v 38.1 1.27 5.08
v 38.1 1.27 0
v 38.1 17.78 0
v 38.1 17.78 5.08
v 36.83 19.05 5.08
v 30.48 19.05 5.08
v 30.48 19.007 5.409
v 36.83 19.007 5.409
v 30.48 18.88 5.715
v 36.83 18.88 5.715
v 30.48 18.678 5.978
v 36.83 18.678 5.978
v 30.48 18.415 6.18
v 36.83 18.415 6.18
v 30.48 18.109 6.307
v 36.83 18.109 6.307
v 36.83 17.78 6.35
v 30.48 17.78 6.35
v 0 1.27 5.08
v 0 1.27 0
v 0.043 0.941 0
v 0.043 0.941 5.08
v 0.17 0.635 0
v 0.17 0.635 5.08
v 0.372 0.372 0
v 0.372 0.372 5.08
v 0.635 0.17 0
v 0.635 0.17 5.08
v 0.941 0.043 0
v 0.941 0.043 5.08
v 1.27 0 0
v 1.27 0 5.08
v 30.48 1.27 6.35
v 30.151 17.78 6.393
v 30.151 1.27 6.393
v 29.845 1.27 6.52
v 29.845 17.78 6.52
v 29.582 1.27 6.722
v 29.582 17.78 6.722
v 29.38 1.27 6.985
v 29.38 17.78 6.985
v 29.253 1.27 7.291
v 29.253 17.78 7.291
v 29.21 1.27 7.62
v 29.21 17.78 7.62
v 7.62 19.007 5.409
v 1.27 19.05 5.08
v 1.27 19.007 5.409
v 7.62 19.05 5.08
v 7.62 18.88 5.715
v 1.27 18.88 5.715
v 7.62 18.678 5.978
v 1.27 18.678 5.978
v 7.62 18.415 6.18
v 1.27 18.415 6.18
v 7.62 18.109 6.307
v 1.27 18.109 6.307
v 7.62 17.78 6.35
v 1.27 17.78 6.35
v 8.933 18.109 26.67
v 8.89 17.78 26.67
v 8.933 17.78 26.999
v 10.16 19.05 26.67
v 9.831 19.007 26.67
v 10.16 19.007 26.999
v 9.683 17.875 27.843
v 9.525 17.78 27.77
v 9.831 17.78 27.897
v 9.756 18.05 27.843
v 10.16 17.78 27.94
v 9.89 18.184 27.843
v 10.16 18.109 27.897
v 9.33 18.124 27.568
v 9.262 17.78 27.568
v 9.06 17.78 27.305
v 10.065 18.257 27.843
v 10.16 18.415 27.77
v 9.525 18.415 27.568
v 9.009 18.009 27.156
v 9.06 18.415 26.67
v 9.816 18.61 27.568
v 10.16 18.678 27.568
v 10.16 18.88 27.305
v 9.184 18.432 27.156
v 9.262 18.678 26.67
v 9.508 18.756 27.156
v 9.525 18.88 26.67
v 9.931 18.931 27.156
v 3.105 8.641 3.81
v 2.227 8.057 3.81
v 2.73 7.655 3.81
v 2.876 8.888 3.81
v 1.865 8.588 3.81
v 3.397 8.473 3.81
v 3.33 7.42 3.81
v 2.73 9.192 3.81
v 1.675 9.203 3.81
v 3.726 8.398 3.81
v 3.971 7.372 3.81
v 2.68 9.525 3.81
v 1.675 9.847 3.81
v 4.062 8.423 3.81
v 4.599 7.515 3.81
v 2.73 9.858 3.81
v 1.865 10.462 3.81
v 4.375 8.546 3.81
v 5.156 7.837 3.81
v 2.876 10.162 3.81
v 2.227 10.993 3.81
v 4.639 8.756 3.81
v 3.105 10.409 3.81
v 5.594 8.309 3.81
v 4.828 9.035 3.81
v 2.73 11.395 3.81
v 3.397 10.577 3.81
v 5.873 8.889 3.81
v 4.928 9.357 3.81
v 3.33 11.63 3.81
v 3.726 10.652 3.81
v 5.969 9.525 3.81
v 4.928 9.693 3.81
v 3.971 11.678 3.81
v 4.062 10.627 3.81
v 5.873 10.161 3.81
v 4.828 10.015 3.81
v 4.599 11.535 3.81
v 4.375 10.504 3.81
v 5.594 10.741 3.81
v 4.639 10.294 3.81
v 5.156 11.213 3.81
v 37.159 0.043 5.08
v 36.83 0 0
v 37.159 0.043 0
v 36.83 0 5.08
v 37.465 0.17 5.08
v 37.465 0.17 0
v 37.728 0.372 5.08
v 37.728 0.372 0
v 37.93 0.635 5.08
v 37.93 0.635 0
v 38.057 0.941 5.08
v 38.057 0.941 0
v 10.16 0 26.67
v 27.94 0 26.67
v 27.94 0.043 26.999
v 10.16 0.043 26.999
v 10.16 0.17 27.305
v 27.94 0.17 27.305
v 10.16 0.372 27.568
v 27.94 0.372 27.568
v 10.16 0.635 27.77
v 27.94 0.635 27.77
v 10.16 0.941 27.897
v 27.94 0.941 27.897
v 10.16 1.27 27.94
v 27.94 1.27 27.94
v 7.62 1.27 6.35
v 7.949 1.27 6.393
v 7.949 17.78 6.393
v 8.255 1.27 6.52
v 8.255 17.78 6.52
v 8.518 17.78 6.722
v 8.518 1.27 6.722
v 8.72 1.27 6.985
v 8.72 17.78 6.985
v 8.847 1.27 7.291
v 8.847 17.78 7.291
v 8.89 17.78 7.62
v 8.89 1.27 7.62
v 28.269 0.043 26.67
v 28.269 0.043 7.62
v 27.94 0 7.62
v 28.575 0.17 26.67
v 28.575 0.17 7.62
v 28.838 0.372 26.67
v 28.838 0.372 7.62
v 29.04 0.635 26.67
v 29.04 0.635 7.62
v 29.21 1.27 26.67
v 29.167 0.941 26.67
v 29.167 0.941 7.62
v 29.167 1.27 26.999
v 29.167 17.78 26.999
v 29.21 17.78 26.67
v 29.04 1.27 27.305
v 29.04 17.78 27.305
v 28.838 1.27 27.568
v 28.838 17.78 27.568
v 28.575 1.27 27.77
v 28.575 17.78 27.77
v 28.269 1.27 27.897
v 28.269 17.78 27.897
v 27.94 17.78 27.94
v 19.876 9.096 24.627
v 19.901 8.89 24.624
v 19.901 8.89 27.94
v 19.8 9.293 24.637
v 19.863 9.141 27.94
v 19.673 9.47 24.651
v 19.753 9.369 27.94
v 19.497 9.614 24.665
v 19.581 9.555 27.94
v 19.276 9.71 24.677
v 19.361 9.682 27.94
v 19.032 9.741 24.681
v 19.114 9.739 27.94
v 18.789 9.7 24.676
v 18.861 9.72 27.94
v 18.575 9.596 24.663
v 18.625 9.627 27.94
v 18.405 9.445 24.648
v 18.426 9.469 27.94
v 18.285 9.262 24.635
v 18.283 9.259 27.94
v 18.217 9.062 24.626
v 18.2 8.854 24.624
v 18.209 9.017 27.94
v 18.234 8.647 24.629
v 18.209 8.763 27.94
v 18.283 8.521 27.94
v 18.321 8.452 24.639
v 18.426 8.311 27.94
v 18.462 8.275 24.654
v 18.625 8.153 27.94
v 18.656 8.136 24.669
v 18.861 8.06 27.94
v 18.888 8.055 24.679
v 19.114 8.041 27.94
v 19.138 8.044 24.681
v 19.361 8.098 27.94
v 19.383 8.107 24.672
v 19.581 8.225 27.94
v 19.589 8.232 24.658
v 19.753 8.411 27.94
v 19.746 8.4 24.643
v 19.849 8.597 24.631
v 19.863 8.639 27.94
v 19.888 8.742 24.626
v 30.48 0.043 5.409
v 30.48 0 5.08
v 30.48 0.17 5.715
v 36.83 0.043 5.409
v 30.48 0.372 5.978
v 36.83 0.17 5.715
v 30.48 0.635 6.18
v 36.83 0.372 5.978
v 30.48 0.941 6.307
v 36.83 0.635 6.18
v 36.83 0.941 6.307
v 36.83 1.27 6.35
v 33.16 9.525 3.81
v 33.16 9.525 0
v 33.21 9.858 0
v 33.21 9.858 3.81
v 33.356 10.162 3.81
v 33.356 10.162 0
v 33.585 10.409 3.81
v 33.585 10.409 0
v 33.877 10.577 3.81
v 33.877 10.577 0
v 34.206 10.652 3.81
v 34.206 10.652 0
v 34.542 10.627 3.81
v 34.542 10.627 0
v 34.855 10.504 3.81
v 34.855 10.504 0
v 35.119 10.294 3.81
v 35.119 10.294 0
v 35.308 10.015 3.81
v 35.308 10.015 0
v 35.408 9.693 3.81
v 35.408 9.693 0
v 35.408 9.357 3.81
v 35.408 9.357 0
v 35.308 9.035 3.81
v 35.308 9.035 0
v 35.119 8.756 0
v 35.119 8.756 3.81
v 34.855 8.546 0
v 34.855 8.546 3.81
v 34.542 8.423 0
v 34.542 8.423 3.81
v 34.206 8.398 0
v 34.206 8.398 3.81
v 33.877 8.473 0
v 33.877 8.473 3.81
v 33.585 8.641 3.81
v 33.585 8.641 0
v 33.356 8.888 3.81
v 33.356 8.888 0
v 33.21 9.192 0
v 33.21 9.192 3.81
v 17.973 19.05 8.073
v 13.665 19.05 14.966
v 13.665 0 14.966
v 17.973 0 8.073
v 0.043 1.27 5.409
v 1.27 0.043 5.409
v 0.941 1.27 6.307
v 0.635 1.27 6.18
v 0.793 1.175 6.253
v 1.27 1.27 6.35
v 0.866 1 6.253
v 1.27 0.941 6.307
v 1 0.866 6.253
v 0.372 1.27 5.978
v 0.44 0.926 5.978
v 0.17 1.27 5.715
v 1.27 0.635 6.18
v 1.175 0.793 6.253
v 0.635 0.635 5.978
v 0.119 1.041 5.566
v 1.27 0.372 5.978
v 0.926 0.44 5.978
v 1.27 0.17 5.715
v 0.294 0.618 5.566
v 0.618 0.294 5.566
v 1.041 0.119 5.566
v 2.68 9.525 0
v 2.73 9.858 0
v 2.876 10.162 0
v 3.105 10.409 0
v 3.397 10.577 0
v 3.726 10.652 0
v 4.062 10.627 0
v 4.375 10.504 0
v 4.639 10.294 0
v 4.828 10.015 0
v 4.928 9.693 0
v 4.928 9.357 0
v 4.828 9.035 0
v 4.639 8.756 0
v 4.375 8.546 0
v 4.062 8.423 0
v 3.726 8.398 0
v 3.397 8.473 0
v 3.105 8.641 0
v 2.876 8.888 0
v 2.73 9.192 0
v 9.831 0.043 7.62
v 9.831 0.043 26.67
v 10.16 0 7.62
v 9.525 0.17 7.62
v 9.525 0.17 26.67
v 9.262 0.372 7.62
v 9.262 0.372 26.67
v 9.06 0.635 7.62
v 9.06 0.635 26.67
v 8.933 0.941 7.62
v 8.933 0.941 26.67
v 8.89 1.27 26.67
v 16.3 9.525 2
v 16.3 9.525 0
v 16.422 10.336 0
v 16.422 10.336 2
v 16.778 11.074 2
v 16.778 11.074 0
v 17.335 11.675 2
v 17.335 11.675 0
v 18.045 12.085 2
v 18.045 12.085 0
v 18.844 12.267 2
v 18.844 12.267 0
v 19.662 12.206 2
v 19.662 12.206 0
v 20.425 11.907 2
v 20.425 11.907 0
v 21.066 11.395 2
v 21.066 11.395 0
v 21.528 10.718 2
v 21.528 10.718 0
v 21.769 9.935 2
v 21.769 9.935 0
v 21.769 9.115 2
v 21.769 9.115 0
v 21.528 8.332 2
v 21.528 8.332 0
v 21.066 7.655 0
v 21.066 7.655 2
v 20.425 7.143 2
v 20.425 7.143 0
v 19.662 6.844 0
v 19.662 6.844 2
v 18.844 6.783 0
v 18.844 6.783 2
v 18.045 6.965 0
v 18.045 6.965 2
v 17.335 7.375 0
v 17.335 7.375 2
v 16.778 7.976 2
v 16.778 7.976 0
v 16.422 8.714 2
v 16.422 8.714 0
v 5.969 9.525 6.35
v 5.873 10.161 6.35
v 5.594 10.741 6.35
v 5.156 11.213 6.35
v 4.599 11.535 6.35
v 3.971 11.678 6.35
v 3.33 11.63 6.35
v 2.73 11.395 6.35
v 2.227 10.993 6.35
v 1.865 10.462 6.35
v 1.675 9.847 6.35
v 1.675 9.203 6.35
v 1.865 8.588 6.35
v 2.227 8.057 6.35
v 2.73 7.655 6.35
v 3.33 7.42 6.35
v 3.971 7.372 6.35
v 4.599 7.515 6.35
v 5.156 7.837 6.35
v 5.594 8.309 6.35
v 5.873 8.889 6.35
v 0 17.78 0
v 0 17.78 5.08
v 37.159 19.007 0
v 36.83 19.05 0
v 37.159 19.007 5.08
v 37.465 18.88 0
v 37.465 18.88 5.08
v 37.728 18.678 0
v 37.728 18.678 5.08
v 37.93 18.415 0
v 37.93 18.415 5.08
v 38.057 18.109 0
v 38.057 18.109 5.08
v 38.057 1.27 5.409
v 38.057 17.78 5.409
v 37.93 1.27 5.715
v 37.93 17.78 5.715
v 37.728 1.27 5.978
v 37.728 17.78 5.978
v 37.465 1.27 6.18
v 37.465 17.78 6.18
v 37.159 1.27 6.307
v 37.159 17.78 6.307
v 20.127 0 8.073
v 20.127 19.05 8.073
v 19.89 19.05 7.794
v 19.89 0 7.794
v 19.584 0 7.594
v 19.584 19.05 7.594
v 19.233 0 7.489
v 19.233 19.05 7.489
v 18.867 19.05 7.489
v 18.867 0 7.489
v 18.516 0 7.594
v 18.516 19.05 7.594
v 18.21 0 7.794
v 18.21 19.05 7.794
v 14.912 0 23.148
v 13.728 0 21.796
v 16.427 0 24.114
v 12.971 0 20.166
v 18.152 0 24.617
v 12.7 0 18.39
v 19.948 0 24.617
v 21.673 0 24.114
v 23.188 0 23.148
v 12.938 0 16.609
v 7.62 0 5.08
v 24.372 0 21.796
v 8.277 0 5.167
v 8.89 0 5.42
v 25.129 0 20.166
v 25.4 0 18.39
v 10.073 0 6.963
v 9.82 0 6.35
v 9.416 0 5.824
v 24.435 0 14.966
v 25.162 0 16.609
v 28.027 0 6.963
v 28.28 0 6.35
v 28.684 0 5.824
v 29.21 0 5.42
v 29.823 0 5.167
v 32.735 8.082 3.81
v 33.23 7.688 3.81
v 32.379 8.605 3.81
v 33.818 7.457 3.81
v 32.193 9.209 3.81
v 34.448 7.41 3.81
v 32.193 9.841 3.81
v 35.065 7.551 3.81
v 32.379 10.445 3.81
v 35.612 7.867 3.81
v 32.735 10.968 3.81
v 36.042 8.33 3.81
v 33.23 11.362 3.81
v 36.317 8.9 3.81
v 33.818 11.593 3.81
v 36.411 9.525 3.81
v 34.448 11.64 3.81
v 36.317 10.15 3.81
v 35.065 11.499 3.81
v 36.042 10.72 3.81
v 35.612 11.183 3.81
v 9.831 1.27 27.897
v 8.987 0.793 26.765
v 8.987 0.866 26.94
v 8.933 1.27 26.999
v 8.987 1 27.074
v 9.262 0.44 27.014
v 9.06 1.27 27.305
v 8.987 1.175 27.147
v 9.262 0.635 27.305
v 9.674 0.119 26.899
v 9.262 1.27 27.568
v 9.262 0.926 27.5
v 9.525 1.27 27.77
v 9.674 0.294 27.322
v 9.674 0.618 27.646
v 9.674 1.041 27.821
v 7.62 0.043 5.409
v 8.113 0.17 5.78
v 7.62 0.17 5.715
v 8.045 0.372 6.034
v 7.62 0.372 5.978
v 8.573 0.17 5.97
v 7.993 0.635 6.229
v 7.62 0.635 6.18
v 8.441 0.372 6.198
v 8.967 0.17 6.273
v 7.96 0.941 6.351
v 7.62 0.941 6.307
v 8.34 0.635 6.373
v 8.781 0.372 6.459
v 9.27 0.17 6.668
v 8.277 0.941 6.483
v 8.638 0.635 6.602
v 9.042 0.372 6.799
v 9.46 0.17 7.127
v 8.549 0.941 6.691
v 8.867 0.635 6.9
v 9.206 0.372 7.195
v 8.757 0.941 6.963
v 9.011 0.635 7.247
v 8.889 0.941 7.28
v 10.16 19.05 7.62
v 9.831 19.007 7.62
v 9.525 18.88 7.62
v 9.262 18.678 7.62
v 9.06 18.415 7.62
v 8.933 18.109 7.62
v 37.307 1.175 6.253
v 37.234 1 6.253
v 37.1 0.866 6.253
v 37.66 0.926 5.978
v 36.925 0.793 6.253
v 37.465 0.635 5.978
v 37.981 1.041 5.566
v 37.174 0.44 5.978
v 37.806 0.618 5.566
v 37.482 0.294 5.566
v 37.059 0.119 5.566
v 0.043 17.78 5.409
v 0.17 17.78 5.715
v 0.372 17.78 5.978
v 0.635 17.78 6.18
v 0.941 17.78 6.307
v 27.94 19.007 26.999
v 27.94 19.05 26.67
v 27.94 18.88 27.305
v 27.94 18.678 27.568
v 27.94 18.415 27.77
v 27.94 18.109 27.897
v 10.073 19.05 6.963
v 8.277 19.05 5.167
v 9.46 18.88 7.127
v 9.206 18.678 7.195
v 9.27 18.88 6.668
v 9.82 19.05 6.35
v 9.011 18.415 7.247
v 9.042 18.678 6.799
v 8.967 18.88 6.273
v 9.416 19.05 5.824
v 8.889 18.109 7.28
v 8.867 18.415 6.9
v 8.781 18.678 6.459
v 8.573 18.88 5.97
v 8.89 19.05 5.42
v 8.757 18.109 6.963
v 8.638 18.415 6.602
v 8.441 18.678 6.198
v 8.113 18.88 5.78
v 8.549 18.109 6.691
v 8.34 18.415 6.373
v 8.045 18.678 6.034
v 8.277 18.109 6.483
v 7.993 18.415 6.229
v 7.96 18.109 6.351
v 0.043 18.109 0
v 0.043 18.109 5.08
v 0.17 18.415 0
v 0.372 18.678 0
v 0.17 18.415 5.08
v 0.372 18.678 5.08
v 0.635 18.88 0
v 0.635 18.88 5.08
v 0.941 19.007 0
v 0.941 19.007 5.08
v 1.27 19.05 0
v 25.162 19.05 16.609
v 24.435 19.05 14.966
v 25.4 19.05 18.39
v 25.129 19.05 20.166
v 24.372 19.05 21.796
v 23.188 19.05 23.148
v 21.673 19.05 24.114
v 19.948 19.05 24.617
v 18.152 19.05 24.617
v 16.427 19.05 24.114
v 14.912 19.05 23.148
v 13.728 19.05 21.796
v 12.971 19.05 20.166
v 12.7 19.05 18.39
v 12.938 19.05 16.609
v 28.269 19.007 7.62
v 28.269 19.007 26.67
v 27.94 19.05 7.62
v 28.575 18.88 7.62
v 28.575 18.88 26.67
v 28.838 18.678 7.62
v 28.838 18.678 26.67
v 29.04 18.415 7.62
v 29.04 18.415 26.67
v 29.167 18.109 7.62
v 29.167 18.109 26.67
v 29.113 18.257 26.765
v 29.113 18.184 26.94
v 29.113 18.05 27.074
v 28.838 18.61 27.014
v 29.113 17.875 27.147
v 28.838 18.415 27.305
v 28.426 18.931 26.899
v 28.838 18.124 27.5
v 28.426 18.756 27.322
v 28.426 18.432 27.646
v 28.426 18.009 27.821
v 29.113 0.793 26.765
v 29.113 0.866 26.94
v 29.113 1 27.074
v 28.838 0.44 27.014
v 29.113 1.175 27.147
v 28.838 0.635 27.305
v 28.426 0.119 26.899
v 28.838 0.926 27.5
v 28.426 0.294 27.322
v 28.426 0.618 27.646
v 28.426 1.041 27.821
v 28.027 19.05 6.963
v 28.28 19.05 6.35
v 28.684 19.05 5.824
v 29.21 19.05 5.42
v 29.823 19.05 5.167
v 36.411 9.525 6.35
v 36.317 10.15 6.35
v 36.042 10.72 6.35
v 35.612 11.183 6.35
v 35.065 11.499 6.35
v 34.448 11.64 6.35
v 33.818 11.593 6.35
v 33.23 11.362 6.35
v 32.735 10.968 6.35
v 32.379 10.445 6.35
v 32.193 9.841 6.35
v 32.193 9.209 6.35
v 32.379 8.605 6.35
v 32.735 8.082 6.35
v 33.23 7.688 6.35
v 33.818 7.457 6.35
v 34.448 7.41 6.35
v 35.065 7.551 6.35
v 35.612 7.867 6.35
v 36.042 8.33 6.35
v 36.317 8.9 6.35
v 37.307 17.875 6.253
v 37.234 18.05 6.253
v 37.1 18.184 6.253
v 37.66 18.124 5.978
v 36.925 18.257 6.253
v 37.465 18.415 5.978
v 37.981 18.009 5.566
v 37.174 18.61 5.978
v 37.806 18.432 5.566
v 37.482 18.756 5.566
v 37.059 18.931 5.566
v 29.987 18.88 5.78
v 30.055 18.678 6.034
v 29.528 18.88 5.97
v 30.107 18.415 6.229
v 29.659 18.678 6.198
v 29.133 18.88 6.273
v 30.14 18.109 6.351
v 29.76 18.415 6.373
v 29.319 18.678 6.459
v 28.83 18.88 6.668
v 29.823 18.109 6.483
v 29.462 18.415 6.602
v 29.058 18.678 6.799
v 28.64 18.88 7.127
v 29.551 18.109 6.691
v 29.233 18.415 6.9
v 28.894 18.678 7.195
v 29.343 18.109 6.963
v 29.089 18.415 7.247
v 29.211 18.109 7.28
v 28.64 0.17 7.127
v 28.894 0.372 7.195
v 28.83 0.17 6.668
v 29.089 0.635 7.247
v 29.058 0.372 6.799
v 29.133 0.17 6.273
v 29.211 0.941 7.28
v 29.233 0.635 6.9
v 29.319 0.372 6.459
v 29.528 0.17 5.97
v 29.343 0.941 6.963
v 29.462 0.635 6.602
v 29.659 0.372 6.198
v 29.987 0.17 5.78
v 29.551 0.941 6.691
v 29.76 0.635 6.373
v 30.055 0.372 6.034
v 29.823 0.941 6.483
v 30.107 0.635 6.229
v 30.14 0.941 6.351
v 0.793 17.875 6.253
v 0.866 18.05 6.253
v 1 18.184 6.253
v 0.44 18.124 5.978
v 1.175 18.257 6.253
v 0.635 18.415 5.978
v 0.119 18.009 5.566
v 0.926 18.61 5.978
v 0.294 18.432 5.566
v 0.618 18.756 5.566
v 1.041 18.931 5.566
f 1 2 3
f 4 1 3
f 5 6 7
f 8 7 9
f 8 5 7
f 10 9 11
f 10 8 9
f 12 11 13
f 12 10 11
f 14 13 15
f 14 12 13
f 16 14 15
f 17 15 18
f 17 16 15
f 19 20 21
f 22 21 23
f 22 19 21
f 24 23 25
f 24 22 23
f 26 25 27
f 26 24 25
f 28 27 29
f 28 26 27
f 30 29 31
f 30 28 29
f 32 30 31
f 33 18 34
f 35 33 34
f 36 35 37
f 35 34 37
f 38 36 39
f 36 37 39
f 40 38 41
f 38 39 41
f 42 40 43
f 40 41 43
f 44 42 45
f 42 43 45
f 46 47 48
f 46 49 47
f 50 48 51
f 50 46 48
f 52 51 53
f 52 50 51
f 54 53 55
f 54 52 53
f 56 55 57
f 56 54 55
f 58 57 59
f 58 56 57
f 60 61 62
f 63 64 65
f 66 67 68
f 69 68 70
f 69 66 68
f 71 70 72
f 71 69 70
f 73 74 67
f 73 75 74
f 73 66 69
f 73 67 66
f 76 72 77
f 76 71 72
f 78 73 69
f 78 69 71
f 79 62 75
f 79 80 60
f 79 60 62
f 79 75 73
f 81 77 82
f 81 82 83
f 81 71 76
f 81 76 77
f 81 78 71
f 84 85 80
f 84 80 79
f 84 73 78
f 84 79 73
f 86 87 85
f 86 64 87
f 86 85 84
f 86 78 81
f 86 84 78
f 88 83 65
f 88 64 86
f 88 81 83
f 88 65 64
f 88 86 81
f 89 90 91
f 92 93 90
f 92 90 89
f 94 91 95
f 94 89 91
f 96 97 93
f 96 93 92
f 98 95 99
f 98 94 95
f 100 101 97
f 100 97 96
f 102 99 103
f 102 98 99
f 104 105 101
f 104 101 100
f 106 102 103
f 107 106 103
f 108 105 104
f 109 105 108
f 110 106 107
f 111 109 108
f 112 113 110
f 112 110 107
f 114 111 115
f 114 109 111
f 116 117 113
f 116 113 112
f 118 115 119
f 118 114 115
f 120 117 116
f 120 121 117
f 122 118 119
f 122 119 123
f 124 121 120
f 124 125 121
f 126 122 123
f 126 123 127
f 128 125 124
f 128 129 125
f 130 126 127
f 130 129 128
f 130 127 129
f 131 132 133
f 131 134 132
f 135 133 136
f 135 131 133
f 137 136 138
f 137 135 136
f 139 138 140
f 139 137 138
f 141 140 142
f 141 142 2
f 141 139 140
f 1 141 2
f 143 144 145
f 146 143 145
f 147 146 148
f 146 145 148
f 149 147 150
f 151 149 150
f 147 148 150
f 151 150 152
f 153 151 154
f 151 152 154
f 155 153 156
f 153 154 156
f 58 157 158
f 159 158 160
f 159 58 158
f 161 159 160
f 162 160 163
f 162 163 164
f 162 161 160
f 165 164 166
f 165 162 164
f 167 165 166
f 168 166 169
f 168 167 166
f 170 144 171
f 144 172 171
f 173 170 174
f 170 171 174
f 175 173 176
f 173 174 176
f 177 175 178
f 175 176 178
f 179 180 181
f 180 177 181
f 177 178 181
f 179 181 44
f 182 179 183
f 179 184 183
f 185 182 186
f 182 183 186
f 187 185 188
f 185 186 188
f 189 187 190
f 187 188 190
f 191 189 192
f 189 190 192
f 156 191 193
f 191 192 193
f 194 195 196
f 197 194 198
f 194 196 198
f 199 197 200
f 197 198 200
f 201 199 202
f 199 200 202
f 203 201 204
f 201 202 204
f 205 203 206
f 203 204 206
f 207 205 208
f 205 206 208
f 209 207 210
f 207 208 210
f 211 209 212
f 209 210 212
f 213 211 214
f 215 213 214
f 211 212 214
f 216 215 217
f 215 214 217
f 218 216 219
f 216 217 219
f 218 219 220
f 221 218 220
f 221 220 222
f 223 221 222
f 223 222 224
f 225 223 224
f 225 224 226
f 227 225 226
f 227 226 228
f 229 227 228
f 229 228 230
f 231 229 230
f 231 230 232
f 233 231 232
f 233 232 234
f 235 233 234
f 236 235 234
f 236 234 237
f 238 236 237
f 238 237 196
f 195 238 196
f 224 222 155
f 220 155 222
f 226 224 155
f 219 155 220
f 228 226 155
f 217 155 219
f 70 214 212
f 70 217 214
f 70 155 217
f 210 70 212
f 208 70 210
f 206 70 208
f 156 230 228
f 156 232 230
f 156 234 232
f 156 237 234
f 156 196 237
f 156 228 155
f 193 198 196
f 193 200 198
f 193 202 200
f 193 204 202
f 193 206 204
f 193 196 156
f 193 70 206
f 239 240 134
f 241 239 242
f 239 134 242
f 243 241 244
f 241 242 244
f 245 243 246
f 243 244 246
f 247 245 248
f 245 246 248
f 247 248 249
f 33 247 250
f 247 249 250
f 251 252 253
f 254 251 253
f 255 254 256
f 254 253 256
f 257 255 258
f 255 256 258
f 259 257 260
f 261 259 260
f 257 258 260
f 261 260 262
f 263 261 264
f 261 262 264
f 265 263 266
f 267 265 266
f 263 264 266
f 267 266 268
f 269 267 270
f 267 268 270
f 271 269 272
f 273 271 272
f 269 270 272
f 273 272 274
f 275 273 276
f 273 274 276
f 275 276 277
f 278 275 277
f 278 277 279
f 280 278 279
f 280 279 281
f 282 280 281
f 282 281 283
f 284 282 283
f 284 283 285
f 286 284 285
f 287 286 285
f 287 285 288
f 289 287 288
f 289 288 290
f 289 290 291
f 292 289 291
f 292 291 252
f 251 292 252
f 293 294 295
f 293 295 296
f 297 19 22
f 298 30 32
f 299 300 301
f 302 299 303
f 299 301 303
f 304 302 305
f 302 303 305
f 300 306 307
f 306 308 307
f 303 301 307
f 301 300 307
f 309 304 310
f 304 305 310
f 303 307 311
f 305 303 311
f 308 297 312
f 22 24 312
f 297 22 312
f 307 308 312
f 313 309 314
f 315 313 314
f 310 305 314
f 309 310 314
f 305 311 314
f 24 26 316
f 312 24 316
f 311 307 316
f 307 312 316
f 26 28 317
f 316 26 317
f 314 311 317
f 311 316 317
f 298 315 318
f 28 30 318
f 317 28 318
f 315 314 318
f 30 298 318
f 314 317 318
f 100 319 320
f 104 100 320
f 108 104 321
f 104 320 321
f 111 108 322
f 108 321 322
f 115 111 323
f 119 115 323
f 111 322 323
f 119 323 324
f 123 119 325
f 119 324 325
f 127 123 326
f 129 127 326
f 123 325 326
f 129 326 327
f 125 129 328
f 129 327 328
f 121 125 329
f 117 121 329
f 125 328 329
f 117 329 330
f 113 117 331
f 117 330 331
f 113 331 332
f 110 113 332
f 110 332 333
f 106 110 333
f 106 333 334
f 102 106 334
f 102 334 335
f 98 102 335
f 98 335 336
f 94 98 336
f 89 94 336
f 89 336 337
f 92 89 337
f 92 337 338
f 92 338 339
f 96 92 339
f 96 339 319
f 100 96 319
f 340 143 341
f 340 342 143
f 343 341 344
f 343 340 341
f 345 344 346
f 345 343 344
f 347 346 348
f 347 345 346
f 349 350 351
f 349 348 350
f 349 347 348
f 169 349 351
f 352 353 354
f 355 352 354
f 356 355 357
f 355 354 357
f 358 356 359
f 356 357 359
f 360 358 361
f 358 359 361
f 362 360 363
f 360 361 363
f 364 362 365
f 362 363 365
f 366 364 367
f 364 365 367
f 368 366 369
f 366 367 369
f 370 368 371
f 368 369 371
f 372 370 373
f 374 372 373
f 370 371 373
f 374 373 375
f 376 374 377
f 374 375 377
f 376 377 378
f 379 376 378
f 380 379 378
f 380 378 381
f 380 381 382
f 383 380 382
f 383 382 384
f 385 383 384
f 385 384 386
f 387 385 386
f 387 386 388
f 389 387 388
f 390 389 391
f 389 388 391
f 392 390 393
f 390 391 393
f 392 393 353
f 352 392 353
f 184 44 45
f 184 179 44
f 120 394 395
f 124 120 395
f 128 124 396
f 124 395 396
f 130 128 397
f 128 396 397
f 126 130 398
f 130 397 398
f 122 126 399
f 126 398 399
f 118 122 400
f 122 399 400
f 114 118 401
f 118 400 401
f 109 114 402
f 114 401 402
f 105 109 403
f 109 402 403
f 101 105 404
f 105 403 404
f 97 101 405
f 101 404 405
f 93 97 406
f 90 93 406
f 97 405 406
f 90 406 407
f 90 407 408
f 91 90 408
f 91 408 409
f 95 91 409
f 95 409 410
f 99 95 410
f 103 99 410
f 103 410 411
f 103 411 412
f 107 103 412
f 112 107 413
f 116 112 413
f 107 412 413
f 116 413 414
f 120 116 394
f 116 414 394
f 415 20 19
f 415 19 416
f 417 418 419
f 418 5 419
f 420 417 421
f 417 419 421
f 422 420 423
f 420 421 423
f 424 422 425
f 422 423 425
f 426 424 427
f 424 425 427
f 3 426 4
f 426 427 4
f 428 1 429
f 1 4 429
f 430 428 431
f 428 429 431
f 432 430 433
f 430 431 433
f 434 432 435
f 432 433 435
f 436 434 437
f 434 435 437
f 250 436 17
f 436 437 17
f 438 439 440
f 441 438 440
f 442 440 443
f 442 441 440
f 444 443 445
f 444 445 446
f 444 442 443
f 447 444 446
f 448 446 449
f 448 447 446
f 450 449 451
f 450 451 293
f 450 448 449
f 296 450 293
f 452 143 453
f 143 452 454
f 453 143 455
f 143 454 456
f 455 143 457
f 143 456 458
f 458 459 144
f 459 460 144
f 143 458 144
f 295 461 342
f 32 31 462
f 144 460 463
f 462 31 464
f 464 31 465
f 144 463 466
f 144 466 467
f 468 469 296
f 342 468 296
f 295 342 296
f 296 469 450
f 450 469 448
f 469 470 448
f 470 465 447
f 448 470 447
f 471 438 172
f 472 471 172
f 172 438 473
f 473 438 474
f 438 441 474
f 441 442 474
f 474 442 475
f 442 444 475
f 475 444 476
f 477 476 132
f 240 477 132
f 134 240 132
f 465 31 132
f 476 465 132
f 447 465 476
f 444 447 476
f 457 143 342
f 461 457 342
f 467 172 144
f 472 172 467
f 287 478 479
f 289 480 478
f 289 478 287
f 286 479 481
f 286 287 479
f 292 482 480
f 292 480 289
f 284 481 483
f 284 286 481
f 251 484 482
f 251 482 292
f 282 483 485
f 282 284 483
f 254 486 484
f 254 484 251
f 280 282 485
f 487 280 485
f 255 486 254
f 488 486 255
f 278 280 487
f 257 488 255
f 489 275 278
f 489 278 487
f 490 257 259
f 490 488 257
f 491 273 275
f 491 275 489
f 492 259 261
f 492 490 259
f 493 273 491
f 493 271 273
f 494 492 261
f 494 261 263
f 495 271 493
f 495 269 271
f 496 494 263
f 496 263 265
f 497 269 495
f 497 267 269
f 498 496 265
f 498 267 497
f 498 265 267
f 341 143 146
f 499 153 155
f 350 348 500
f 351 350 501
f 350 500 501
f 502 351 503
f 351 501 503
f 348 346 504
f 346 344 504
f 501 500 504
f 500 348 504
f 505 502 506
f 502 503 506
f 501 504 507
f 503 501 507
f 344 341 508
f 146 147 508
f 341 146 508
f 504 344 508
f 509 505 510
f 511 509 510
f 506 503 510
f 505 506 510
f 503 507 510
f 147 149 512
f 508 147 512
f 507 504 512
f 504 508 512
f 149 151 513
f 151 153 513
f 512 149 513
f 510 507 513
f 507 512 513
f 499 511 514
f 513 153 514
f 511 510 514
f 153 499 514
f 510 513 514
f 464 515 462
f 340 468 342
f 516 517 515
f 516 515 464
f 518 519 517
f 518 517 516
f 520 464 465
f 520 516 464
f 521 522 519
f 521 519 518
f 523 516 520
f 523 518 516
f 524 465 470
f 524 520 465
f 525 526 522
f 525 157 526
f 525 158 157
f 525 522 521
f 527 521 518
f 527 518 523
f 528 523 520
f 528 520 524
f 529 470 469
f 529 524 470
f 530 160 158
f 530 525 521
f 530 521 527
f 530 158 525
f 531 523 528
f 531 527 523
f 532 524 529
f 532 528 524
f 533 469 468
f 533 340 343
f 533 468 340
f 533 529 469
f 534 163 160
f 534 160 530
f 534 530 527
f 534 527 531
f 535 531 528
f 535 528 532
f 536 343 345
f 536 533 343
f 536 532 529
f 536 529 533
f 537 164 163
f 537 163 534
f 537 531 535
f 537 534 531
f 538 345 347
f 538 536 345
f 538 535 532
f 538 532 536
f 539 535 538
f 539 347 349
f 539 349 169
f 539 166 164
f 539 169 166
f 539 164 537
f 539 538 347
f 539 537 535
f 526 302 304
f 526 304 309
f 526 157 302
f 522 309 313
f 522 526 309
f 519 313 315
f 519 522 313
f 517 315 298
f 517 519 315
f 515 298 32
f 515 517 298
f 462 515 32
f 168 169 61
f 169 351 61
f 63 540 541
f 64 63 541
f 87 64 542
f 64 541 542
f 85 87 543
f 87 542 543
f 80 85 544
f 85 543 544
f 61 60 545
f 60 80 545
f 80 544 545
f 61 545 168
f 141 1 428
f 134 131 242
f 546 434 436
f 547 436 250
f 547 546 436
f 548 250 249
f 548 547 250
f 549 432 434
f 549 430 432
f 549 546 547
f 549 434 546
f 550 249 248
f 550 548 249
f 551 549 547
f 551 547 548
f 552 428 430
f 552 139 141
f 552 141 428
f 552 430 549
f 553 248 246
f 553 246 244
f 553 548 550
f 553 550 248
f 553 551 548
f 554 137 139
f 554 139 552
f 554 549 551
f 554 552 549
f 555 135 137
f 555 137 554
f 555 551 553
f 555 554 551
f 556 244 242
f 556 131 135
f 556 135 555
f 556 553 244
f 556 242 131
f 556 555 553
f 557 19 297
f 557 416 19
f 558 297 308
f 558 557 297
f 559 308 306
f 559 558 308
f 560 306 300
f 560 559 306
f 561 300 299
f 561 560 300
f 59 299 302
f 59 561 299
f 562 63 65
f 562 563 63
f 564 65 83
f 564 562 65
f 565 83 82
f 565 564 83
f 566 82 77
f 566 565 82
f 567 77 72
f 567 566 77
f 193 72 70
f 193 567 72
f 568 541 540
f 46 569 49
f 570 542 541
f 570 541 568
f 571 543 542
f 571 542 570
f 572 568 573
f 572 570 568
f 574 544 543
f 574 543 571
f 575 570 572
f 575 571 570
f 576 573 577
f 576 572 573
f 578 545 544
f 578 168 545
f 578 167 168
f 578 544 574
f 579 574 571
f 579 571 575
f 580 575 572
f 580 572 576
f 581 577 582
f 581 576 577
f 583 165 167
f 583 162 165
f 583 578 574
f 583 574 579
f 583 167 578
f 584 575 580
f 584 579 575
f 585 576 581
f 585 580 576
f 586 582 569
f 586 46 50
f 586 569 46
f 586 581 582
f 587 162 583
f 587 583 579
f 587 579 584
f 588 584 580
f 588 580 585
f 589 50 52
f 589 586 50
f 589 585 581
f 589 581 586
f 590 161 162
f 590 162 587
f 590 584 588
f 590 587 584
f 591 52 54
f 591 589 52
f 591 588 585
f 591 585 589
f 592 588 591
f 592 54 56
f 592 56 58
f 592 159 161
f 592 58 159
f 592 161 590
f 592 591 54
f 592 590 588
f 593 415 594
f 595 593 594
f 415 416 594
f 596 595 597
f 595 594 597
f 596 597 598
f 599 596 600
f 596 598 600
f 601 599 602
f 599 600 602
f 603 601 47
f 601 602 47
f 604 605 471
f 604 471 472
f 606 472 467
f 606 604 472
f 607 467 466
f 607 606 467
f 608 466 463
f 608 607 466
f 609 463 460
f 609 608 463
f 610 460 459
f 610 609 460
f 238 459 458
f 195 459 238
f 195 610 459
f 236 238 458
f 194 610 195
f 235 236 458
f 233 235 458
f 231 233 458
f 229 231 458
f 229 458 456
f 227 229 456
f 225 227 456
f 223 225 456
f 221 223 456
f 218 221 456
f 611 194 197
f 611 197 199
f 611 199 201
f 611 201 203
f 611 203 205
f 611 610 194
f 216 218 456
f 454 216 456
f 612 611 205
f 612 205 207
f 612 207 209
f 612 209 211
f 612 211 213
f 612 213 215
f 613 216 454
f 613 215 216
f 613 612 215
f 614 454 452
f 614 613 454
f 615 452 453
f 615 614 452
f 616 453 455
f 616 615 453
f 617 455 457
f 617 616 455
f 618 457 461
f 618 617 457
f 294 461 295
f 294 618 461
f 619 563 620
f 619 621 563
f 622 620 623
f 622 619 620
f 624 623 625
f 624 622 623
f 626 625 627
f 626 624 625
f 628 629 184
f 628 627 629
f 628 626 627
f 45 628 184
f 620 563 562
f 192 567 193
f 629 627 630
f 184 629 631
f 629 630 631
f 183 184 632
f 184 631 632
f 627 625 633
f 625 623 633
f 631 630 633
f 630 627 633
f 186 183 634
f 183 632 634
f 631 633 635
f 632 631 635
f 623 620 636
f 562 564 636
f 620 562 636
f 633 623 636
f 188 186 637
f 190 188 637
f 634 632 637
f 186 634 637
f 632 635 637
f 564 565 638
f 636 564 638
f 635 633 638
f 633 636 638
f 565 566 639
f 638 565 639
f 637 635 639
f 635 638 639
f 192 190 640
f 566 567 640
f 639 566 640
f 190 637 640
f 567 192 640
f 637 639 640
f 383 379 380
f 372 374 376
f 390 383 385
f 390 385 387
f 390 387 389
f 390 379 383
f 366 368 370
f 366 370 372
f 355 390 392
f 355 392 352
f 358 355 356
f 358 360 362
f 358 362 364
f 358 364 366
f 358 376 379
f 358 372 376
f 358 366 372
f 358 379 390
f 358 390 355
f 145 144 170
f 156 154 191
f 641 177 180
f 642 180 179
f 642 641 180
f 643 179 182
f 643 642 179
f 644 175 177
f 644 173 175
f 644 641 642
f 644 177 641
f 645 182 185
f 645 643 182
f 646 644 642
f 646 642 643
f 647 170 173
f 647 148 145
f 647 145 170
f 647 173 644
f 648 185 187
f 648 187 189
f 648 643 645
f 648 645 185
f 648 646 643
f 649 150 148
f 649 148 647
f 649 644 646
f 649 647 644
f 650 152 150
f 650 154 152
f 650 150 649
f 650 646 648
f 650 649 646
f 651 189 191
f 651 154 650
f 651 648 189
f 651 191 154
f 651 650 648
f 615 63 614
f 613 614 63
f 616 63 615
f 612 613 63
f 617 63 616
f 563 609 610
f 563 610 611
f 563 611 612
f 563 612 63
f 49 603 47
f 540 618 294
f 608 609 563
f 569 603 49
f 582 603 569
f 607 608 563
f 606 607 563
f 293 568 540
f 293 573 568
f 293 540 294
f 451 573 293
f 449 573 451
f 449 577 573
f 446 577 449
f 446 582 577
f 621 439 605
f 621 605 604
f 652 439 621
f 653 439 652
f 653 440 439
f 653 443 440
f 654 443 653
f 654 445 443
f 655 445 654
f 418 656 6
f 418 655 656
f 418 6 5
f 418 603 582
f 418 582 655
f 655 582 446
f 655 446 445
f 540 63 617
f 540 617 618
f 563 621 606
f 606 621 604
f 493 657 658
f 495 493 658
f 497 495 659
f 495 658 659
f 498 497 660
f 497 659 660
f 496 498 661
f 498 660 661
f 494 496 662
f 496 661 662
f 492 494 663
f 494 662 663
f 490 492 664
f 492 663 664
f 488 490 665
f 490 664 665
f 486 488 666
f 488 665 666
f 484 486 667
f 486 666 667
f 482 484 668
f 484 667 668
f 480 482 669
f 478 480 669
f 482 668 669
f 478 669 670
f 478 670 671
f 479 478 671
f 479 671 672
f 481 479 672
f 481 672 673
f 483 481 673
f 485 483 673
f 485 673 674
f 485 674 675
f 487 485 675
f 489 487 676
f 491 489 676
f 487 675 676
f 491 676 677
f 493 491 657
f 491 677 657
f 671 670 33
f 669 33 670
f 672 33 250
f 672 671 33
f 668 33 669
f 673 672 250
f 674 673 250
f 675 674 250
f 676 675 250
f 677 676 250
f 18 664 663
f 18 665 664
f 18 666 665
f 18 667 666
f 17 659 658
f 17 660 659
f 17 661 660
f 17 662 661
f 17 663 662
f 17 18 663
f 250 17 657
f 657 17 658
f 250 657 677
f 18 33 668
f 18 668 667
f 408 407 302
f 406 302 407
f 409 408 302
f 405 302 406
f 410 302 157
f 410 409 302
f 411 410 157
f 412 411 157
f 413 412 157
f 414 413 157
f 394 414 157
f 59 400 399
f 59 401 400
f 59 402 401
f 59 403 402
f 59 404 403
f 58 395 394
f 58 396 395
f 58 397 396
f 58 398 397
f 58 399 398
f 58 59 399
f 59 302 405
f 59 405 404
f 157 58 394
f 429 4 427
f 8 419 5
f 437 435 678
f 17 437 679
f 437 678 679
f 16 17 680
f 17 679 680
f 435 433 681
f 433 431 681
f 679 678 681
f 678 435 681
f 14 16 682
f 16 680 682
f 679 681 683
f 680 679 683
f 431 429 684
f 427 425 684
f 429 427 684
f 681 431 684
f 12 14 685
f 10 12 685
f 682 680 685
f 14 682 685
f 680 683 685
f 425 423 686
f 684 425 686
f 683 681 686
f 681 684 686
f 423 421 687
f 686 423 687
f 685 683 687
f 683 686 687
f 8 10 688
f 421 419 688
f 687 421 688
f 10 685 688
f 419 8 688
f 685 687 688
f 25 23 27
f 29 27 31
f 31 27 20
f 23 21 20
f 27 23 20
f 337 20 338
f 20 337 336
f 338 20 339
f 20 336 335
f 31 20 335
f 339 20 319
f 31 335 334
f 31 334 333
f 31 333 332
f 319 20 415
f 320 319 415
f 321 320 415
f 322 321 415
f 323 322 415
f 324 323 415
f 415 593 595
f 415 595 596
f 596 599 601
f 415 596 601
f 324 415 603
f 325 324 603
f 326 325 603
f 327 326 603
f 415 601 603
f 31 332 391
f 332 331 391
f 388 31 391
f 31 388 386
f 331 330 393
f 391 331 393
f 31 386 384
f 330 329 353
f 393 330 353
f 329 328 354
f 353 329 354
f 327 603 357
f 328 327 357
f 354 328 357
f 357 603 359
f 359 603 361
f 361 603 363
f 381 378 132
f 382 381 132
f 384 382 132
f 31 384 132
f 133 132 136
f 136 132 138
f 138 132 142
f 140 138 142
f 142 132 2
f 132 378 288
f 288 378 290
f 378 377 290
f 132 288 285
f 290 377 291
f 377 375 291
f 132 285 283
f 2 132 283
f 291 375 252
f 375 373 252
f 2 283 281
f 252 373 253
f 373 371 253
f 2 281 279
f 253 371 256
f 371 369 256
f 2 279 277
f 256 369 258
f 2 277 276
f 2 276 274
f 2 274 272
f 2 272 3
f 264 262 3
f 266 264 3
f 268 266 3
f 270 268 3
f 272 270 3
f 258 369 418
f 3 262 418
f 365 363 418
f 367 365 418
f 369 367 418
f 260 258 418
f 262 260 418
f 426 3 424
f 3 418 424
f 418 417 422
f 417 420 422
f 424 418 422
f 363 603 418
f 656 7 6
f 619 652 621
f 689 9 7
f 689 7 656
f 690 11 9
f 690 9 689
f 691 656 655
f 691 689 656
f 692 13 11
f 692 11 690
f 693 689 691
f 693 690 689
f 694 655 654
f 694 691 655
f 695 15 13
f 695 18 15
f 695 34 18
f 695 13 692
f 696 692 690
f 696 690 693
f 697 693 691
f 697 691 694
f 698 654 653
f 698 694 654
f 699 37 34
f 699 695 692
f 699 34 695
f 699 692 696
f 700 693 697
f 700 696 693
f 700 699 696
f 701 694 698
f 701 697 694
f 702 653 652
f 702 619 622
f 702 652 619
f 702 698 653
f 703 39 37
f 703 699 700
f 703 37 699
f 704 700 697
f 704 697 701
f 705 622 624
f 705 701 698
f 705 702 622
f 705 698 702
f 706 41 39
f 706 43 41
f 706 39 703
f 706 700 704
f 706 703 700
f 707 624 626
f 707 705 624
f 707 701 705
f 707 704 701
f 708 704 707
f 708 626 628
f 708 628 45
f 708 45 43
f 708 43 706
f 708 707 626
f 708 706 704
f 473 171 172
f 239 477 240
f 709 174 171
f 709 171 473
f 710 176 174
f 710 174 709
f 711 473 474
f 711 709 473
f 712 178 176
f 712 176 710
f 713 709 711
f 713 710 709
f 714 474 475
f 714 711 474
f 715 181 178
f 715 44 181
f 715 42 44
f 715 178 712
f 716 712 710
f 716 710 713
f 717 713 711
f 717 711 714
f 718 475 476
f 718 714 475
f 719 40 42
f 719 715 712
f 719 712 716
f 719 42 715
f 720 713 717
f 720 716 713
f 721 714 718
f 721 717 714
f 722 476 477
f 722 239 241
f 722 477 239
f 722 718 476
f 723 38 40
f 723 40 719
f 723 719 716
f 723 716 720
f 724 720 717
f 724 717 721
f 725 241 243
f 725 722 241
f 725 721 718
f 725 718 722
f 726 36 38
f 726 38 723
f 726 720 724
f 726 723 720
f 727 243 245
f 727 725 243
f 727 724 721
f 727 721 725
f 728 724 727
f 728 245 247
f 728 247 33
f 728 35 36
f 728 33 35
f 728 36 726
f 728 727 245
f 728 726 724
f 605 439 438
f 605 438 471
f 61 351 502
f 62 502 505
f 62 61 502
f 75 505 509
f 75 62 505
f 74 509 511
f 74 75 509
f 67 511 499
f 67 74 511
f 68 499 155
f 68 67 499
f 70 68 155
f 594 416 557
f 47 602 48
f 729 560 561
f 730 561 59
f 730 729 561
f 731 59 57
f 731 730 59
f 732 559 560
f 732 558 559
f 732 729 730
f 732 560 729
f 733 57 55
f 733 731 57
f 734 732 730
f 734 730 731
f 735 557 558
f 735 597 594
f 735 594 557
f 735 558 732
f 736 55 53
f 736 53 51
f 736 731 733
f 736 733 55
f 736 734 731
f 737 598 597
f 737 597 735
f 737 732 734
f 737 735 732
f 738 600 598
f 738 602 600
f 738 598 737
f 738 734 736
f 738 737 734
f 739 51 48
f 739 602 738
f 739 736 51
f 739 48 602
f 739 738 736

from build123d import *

# Parameters (mm, degrees)
SKETCH1_W                        = 38.1
SKETCH1_H                        = 19.05
BOSS_EXTRUDE1_DEPTH              = 27.94
SKETCH2_W                        = 8.89
SKETCH2_H                        = 19.05
CUT_EXTRUDE1_DEPTH               = 21.59
CUT_EXTRUDE2_DEPTH               = 31.75
F_43_0_089_DIAMETER_HOLE1_D      = 2.2606
F_51_0_067_DIAMETER_HOLE1_REACH  = 52.943
F_51_0_067_DIAMETER_HOLE1_BORE_R = 0.8509
FILLET1_R                        = 1.27
SKETCH11_R                       = 2.75
CUT_EXTRUDE3_DEPTH               = 2
SKETCH12_R                       = 2.159
SKETCH12_R_2                     = 2.1209
CUT_EXTRUDE4_DEPTH               = 2.54


with BuildPart() as part:
    # Sketch1 → Boss-Extrude1 (new body)
    with BuildSketch(Plane.XY):
        with Locations((19.05, 9.525)):
            Rectangle(SKETCH1_W, SKETCH1_H)
    extrude(amount=BOSS_EXTRUDE1_DEPTH)

    # Sketch2 → Cut-Extrude1 (cut)
    with BuildSketch(Plane.XY.offset(27.94)):
        with Locations((4.445, 9.525)):
            Rectangle(SKETCH2_W, SKETCH2_H)
        with Locations((33.655, 9.525)):
            Rectangle(SKETCH2_W, SKETCH2_H)
    extrude(amount=-CUT_EXTRUDE1_DEPTH, mode=Mode.SUBTRACT)

    # Sketch4 → Cut-Extrude2 (cut)
    with BuildSketch(Plane(origin=(0, 19.05, 0), x_dir=(1, 0, 0), z_dir=(0, 1, 0))):
        with BuildLine():
            Line((13.66521077, -14.965662769), (19.05, -6.35))
            Line((19.05, -6.35), (24.43478923, -14.965662769))
            ThreePointArc((24.43478923, -14.965662769), (19.05, -24.681156038), (13.66521077, -14.965662769))
        make_face()
    extrude(amount=-CUT_EXTRUDE2_DEPTH, mode=Mode.SUBTRACT)

    # #43 (0.089) Diameter Hole1 (through all)
    with Locations(Plane.XY.offset(6.35)):
        with Locations((3.81, 9.525), (34.29, 9.525)):
            Hole(F_43_0_089_DIAMETER_HOLE1_D / 2)

    # #51 (0.067) Diameter Hole1 bore → #51 (0.067) Diameter Hole1 (cut, up to next)
    with BuildSketch(Plane.XY.offset(27.94), mode=Mode.PRIVATE) as f_51_0_067_diameter_hole1_sk1:
        with Locations((19.05, 8.89)):
            Circle(F_51_0_067_DIAMETER_HOLE1_BORE_R)
    f_51_0_067_diameter_hole1_tool1 = extrude(f_51_0_067_diameter_hole1_sk1.sketch, amount=-F_51_0_067_DIAMETER_HOLE1_REACH, mode=Mode.PRIVATE) & part.part
    add(f_51_0_067_diameter_hole1_tool1.solids().sort_by_distance((19.05, 8.89, 27.94))[0], mode=Mode.SUBTRACT)

    # Fillet1
    fillet1_edges = [part.edges().sort_by_distance(p)[0] for p in [
        (19.05, 0, 27.94),
        (0, 19.05, 3.175),
        (0, 0, 3.175),
        (0, 9.525, 6.35),
        (4.445, 19.05, 6.35),
        (8.89, 9.525, 6.35),
        (8.89, 19.05, 17.145),
        (4.445, 0, 6.35),
        (8.89, 0, 17.145),
        (8.89, 9.525, 27.94),
        (19.05, 19.05, 27.94),
        (38.1, 19.05, 3.175),
        (38.1, 0, 3.175),
        (38.1, 9.525, 6.35),
        (33.655, 0, 6.35),
        (29.21, 9.525, 6.35),
        (29.21, 0, 17.145),
        (33.655, 19.05, 6.35),
        (29.21, 19.05, 17.145),
        (29.21, 9.525, 27.94),
        (19.05, 9.525, 6.35),
    ]]
    fillet(fillet1_edges, radius=FILLET1_R)

    # Sketch11 → Cut-Extrude3 (cut)
    with BuildSketch(Plane(origin=(0, 0, 0), x_dir=(-1, 0, 0), z_dir=(0, 0, -1))):
        with Locations((-19.05, 9.525)):
            Circle(SKETCH11_R)
    extrude(amount=-CUT_EXTRUDE3_DEPTH, mode=Mode.SUBTRACT)

    # Sketch12 → Cut-Extrude4 (cut)
    with BuildSketch(Plane.XY.offset(6.35)):
        with Locations((3.81, 9.525)):
            Circle(SKETCH12_R)
        with Locations((34.29, 9.525)):
            Circle(SKETCH12_R_2)
    extrude(amount=-CUT_EXTRUDE4_DEPTH, mode=Mode.SUBTRACT)


solid = part.part
